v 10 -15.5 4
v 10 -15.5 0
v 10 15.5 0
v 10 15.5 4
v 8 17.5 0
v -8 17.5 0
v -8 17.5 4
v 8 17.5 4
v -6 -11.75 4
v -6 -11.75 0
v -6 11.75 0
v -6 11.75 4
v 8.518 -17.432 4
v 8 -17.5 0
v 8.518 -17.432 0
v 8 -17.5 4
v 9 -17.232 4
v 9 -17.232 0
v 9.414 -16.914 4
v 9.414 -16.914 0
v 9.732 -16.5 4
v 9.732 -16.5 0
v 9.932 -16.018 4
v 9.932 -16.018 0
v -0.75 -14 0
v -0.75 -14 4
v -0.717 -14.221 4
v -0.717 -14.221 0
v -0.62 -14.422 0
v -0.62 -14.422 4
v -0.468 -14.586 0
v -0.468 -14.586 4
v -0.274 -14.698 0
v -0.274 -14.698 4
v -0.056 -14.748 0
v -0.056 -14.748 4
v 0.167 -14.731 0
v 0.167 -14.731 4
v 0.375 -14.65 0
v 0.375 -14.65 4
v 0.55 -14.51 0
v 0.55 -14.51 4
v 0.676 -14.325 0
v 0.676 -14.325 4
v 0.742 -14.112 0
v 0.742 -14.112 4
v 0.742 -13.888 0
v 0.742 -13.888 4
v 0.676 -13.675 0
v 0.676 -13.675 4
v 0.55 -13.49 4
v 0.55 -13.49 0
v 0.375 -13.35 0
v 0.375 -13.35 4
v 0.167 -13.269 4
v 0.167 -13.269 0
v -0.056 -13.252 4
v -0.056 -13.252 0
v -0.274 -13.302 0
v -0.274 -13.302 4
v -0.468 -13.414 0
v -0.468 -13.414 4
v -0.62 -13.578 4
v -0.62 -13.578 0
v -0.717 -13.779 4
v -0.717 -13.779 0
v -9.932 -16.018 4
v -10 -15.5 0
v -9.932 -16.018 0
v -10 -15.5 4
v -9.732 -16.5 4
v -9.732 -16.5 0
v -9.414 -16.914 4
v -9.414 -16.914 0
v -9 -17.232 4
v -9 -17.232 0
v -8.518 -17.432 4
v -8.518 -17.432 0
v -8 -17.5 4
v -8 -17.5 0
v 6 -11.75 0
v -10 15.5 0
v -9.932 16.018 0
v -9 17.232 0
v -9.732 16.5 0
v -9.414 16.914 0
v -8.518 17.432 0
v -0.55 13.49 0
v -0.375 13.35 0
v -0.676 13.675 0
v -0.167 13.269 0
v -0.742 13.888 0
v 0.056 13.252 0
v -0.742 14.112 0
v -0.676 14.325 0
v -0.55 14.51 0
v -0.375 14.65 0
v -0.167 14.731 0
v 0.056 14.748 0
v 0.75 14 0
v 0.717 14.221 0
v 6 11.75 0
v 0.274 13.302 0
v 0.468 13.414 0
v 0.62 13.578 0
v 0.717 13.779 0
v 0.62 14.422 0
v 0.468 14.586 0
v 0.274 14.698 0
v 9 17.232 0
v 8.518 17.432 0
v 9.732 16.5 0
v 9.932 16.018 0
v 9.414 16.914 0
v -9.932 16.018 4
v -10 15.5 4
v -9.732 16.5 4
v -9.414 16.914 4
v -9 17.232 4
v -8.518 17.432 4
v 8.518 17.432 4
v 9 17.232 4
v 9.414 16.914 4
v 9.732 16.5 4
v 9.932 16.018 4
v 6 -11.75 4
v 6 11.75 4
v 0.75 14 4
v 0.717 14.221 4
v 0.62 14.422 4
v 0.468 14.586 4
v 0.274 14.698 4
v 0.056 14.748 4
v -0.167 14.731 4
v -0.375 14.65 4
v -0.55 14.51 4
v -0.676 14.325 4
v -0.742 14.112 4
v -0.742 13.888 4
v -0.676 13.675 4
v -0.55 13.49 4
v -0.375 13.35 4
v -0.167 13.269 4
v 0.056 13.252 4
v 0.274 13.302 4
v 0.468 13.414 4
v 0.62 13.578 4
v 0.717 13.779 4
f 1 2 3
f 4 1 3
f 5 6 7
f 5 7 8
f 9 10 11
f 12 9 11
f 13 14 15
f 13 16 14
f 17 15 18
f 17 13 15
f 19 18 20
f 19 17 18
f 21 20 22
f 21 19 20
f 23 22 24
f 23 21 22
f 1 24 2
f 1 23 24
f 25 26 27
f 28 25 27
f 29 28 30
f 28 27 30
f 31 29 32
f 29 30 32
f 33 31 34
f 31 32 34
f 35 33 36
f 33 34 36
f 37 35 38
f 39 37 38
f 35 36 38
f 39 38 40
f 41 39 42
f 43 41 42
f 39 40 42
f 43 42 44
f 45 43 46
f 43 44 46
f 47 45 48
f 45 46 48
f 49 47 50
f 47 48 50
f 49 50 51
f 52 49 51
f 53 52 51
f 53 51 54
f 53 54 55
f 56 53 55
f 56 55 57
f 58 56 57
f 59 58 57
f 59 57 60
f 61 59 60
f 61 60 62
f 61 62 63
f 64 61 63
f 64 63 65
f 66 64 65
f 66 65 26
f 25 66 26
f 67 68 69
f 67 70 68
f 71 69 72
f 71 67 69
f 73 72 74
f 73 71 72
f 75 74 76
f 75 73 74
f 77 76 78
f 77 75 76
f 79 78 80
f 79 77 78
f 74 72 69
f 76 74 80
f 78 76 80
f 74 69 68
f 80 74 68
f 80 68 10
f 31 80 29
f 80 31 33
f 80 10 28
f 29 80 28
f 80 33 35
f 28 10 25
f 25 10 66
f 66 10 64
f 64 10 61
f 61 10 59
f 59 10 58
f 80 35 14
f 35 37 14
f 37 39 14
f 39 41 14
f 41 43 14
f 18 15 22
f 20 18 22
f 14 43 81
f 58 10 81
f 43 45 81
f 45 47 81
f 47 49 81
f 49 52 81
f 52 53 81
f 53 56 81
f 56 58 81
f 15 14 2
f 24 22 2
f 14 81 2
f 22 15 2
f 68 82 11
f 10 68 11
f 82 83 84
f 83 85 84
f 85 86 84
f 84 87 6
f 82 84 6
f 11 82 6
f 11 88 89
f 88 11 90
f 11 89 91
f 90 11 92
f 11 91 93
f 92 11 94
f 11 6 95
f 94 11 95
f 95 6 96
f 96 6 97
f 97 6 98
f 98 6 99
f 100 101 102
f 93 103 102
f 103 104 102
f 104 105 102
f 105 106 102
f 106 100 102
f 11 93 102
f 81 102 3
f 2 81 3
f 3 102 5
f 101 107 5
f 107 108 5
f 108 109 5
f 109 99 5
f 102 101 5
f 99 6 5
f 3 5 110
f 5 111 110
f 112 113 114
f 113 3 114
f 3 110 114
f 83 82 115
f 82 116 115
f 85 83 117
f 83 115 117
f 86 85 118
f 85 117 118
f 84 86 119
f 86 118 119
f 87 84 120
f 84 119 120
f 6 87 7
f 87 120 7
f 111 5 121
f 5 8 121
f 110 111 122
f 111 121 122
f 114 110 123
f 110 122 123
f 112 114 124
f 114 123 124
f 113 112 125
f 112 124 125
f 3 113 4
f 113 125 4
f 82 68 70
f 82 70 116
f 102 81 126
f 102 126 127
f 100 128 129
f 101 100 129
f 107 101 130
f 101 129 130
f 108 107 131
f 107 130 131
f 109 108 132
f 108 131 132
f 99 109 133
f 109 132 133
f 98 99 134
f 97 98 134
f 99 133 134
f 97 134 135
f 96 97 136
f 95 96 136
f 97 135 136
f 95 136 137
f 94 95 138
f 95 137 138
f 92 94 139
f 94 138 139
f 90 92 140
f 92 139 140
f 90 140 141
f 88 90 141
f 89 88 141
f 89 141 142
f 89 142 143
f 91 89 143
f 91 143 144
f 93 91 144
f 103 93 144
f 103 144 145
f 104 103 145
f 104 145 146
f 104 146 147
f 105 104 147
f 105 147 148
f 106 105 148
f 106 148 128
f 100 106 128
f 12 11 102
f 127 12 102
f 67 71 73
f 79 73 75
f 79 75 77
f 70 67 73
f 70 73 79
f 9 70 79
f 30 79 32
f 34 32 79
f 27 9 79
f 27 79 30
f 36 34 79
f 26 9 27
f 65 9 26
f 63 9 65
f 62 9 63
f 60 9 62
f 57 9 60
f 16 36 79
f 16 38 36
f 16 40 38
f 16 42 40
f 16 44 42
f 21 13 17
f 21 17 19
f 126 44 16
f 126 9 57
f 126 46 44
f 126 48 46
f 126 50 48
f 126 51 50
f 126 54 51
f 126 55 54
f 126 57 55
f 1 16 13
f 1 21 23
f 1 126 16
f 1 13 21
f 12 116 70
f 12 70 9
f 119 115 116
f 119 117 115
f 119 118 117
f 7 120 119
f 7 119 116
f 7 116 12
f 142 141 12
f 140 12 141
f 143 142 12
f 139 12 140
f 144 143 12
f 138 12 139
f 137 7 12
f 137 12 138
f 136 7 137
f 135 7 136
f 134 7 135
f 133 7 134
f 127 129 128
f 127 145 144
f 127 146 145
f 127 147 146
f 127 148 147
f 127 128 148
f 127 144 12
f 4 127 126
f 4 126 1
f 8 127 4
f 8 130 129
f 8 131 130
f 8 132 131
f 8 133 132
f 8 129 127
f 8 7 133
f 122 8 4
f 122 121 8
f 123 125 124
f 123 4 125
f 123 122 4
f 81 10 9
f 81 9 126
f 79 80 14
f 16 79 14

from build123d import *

# Parameters (mm, degrees)
SKIZZE1_W                       = 20
SKIZZE1_H                       = 35
SKIZZE1_W_2                     = 12
SKIZZE1_H_2                     = 23.5
GRUNDPLATTE_DEPTH               = 4
SKIZZE2_R                       = 0.75
SCHNITT_LINEAR_AUSTRAGEN1_DEPTH = 21.548722588
VERRUNDUNG1_R                   = 2


with BuildPart() as part:
    # Skizze1 → Grundplatte (new body)
    with BuildSketch(Plane.XY):
        Rectangle(SKIZZE1_W, SKIZZE1_H)
        Rectangle(SKIZZE1_W_2, SKIZZE1_H_2, mode=Mode.SUBTRACT)
    extrude(amount=GRUNDPLATTE_DEPTH)

    # Skizze2 → Schnitt-Linear austragen1 (cut, through all)
    with BuildSketch(Plane.XY.offset(4)):
        with Locations((0, 14)):
            Circle(SKIZZE2_R)
        with Locations(Location((0, -14, 0), (0, 0, 180))):
            Circle(SKIZZE2_R)
    extrude(amount=-SCHNITT_LINEAR_AUSTRAGEN1_DEPTH, mode=Mode.SUBTRACT)

    # Verrundung1
    verrundung1_edges = [part.edges().sort_by_distance(p)[0] for p in [
        (10, -17.5, 2),
        (-10, -17.5, 2),
        (-10, 17.5, 2),
        (10, 17.5, 2),
    ]]
    fillet(verrundung1_edges, radius=VERRUNDUNG1_R)


solid = part.part
